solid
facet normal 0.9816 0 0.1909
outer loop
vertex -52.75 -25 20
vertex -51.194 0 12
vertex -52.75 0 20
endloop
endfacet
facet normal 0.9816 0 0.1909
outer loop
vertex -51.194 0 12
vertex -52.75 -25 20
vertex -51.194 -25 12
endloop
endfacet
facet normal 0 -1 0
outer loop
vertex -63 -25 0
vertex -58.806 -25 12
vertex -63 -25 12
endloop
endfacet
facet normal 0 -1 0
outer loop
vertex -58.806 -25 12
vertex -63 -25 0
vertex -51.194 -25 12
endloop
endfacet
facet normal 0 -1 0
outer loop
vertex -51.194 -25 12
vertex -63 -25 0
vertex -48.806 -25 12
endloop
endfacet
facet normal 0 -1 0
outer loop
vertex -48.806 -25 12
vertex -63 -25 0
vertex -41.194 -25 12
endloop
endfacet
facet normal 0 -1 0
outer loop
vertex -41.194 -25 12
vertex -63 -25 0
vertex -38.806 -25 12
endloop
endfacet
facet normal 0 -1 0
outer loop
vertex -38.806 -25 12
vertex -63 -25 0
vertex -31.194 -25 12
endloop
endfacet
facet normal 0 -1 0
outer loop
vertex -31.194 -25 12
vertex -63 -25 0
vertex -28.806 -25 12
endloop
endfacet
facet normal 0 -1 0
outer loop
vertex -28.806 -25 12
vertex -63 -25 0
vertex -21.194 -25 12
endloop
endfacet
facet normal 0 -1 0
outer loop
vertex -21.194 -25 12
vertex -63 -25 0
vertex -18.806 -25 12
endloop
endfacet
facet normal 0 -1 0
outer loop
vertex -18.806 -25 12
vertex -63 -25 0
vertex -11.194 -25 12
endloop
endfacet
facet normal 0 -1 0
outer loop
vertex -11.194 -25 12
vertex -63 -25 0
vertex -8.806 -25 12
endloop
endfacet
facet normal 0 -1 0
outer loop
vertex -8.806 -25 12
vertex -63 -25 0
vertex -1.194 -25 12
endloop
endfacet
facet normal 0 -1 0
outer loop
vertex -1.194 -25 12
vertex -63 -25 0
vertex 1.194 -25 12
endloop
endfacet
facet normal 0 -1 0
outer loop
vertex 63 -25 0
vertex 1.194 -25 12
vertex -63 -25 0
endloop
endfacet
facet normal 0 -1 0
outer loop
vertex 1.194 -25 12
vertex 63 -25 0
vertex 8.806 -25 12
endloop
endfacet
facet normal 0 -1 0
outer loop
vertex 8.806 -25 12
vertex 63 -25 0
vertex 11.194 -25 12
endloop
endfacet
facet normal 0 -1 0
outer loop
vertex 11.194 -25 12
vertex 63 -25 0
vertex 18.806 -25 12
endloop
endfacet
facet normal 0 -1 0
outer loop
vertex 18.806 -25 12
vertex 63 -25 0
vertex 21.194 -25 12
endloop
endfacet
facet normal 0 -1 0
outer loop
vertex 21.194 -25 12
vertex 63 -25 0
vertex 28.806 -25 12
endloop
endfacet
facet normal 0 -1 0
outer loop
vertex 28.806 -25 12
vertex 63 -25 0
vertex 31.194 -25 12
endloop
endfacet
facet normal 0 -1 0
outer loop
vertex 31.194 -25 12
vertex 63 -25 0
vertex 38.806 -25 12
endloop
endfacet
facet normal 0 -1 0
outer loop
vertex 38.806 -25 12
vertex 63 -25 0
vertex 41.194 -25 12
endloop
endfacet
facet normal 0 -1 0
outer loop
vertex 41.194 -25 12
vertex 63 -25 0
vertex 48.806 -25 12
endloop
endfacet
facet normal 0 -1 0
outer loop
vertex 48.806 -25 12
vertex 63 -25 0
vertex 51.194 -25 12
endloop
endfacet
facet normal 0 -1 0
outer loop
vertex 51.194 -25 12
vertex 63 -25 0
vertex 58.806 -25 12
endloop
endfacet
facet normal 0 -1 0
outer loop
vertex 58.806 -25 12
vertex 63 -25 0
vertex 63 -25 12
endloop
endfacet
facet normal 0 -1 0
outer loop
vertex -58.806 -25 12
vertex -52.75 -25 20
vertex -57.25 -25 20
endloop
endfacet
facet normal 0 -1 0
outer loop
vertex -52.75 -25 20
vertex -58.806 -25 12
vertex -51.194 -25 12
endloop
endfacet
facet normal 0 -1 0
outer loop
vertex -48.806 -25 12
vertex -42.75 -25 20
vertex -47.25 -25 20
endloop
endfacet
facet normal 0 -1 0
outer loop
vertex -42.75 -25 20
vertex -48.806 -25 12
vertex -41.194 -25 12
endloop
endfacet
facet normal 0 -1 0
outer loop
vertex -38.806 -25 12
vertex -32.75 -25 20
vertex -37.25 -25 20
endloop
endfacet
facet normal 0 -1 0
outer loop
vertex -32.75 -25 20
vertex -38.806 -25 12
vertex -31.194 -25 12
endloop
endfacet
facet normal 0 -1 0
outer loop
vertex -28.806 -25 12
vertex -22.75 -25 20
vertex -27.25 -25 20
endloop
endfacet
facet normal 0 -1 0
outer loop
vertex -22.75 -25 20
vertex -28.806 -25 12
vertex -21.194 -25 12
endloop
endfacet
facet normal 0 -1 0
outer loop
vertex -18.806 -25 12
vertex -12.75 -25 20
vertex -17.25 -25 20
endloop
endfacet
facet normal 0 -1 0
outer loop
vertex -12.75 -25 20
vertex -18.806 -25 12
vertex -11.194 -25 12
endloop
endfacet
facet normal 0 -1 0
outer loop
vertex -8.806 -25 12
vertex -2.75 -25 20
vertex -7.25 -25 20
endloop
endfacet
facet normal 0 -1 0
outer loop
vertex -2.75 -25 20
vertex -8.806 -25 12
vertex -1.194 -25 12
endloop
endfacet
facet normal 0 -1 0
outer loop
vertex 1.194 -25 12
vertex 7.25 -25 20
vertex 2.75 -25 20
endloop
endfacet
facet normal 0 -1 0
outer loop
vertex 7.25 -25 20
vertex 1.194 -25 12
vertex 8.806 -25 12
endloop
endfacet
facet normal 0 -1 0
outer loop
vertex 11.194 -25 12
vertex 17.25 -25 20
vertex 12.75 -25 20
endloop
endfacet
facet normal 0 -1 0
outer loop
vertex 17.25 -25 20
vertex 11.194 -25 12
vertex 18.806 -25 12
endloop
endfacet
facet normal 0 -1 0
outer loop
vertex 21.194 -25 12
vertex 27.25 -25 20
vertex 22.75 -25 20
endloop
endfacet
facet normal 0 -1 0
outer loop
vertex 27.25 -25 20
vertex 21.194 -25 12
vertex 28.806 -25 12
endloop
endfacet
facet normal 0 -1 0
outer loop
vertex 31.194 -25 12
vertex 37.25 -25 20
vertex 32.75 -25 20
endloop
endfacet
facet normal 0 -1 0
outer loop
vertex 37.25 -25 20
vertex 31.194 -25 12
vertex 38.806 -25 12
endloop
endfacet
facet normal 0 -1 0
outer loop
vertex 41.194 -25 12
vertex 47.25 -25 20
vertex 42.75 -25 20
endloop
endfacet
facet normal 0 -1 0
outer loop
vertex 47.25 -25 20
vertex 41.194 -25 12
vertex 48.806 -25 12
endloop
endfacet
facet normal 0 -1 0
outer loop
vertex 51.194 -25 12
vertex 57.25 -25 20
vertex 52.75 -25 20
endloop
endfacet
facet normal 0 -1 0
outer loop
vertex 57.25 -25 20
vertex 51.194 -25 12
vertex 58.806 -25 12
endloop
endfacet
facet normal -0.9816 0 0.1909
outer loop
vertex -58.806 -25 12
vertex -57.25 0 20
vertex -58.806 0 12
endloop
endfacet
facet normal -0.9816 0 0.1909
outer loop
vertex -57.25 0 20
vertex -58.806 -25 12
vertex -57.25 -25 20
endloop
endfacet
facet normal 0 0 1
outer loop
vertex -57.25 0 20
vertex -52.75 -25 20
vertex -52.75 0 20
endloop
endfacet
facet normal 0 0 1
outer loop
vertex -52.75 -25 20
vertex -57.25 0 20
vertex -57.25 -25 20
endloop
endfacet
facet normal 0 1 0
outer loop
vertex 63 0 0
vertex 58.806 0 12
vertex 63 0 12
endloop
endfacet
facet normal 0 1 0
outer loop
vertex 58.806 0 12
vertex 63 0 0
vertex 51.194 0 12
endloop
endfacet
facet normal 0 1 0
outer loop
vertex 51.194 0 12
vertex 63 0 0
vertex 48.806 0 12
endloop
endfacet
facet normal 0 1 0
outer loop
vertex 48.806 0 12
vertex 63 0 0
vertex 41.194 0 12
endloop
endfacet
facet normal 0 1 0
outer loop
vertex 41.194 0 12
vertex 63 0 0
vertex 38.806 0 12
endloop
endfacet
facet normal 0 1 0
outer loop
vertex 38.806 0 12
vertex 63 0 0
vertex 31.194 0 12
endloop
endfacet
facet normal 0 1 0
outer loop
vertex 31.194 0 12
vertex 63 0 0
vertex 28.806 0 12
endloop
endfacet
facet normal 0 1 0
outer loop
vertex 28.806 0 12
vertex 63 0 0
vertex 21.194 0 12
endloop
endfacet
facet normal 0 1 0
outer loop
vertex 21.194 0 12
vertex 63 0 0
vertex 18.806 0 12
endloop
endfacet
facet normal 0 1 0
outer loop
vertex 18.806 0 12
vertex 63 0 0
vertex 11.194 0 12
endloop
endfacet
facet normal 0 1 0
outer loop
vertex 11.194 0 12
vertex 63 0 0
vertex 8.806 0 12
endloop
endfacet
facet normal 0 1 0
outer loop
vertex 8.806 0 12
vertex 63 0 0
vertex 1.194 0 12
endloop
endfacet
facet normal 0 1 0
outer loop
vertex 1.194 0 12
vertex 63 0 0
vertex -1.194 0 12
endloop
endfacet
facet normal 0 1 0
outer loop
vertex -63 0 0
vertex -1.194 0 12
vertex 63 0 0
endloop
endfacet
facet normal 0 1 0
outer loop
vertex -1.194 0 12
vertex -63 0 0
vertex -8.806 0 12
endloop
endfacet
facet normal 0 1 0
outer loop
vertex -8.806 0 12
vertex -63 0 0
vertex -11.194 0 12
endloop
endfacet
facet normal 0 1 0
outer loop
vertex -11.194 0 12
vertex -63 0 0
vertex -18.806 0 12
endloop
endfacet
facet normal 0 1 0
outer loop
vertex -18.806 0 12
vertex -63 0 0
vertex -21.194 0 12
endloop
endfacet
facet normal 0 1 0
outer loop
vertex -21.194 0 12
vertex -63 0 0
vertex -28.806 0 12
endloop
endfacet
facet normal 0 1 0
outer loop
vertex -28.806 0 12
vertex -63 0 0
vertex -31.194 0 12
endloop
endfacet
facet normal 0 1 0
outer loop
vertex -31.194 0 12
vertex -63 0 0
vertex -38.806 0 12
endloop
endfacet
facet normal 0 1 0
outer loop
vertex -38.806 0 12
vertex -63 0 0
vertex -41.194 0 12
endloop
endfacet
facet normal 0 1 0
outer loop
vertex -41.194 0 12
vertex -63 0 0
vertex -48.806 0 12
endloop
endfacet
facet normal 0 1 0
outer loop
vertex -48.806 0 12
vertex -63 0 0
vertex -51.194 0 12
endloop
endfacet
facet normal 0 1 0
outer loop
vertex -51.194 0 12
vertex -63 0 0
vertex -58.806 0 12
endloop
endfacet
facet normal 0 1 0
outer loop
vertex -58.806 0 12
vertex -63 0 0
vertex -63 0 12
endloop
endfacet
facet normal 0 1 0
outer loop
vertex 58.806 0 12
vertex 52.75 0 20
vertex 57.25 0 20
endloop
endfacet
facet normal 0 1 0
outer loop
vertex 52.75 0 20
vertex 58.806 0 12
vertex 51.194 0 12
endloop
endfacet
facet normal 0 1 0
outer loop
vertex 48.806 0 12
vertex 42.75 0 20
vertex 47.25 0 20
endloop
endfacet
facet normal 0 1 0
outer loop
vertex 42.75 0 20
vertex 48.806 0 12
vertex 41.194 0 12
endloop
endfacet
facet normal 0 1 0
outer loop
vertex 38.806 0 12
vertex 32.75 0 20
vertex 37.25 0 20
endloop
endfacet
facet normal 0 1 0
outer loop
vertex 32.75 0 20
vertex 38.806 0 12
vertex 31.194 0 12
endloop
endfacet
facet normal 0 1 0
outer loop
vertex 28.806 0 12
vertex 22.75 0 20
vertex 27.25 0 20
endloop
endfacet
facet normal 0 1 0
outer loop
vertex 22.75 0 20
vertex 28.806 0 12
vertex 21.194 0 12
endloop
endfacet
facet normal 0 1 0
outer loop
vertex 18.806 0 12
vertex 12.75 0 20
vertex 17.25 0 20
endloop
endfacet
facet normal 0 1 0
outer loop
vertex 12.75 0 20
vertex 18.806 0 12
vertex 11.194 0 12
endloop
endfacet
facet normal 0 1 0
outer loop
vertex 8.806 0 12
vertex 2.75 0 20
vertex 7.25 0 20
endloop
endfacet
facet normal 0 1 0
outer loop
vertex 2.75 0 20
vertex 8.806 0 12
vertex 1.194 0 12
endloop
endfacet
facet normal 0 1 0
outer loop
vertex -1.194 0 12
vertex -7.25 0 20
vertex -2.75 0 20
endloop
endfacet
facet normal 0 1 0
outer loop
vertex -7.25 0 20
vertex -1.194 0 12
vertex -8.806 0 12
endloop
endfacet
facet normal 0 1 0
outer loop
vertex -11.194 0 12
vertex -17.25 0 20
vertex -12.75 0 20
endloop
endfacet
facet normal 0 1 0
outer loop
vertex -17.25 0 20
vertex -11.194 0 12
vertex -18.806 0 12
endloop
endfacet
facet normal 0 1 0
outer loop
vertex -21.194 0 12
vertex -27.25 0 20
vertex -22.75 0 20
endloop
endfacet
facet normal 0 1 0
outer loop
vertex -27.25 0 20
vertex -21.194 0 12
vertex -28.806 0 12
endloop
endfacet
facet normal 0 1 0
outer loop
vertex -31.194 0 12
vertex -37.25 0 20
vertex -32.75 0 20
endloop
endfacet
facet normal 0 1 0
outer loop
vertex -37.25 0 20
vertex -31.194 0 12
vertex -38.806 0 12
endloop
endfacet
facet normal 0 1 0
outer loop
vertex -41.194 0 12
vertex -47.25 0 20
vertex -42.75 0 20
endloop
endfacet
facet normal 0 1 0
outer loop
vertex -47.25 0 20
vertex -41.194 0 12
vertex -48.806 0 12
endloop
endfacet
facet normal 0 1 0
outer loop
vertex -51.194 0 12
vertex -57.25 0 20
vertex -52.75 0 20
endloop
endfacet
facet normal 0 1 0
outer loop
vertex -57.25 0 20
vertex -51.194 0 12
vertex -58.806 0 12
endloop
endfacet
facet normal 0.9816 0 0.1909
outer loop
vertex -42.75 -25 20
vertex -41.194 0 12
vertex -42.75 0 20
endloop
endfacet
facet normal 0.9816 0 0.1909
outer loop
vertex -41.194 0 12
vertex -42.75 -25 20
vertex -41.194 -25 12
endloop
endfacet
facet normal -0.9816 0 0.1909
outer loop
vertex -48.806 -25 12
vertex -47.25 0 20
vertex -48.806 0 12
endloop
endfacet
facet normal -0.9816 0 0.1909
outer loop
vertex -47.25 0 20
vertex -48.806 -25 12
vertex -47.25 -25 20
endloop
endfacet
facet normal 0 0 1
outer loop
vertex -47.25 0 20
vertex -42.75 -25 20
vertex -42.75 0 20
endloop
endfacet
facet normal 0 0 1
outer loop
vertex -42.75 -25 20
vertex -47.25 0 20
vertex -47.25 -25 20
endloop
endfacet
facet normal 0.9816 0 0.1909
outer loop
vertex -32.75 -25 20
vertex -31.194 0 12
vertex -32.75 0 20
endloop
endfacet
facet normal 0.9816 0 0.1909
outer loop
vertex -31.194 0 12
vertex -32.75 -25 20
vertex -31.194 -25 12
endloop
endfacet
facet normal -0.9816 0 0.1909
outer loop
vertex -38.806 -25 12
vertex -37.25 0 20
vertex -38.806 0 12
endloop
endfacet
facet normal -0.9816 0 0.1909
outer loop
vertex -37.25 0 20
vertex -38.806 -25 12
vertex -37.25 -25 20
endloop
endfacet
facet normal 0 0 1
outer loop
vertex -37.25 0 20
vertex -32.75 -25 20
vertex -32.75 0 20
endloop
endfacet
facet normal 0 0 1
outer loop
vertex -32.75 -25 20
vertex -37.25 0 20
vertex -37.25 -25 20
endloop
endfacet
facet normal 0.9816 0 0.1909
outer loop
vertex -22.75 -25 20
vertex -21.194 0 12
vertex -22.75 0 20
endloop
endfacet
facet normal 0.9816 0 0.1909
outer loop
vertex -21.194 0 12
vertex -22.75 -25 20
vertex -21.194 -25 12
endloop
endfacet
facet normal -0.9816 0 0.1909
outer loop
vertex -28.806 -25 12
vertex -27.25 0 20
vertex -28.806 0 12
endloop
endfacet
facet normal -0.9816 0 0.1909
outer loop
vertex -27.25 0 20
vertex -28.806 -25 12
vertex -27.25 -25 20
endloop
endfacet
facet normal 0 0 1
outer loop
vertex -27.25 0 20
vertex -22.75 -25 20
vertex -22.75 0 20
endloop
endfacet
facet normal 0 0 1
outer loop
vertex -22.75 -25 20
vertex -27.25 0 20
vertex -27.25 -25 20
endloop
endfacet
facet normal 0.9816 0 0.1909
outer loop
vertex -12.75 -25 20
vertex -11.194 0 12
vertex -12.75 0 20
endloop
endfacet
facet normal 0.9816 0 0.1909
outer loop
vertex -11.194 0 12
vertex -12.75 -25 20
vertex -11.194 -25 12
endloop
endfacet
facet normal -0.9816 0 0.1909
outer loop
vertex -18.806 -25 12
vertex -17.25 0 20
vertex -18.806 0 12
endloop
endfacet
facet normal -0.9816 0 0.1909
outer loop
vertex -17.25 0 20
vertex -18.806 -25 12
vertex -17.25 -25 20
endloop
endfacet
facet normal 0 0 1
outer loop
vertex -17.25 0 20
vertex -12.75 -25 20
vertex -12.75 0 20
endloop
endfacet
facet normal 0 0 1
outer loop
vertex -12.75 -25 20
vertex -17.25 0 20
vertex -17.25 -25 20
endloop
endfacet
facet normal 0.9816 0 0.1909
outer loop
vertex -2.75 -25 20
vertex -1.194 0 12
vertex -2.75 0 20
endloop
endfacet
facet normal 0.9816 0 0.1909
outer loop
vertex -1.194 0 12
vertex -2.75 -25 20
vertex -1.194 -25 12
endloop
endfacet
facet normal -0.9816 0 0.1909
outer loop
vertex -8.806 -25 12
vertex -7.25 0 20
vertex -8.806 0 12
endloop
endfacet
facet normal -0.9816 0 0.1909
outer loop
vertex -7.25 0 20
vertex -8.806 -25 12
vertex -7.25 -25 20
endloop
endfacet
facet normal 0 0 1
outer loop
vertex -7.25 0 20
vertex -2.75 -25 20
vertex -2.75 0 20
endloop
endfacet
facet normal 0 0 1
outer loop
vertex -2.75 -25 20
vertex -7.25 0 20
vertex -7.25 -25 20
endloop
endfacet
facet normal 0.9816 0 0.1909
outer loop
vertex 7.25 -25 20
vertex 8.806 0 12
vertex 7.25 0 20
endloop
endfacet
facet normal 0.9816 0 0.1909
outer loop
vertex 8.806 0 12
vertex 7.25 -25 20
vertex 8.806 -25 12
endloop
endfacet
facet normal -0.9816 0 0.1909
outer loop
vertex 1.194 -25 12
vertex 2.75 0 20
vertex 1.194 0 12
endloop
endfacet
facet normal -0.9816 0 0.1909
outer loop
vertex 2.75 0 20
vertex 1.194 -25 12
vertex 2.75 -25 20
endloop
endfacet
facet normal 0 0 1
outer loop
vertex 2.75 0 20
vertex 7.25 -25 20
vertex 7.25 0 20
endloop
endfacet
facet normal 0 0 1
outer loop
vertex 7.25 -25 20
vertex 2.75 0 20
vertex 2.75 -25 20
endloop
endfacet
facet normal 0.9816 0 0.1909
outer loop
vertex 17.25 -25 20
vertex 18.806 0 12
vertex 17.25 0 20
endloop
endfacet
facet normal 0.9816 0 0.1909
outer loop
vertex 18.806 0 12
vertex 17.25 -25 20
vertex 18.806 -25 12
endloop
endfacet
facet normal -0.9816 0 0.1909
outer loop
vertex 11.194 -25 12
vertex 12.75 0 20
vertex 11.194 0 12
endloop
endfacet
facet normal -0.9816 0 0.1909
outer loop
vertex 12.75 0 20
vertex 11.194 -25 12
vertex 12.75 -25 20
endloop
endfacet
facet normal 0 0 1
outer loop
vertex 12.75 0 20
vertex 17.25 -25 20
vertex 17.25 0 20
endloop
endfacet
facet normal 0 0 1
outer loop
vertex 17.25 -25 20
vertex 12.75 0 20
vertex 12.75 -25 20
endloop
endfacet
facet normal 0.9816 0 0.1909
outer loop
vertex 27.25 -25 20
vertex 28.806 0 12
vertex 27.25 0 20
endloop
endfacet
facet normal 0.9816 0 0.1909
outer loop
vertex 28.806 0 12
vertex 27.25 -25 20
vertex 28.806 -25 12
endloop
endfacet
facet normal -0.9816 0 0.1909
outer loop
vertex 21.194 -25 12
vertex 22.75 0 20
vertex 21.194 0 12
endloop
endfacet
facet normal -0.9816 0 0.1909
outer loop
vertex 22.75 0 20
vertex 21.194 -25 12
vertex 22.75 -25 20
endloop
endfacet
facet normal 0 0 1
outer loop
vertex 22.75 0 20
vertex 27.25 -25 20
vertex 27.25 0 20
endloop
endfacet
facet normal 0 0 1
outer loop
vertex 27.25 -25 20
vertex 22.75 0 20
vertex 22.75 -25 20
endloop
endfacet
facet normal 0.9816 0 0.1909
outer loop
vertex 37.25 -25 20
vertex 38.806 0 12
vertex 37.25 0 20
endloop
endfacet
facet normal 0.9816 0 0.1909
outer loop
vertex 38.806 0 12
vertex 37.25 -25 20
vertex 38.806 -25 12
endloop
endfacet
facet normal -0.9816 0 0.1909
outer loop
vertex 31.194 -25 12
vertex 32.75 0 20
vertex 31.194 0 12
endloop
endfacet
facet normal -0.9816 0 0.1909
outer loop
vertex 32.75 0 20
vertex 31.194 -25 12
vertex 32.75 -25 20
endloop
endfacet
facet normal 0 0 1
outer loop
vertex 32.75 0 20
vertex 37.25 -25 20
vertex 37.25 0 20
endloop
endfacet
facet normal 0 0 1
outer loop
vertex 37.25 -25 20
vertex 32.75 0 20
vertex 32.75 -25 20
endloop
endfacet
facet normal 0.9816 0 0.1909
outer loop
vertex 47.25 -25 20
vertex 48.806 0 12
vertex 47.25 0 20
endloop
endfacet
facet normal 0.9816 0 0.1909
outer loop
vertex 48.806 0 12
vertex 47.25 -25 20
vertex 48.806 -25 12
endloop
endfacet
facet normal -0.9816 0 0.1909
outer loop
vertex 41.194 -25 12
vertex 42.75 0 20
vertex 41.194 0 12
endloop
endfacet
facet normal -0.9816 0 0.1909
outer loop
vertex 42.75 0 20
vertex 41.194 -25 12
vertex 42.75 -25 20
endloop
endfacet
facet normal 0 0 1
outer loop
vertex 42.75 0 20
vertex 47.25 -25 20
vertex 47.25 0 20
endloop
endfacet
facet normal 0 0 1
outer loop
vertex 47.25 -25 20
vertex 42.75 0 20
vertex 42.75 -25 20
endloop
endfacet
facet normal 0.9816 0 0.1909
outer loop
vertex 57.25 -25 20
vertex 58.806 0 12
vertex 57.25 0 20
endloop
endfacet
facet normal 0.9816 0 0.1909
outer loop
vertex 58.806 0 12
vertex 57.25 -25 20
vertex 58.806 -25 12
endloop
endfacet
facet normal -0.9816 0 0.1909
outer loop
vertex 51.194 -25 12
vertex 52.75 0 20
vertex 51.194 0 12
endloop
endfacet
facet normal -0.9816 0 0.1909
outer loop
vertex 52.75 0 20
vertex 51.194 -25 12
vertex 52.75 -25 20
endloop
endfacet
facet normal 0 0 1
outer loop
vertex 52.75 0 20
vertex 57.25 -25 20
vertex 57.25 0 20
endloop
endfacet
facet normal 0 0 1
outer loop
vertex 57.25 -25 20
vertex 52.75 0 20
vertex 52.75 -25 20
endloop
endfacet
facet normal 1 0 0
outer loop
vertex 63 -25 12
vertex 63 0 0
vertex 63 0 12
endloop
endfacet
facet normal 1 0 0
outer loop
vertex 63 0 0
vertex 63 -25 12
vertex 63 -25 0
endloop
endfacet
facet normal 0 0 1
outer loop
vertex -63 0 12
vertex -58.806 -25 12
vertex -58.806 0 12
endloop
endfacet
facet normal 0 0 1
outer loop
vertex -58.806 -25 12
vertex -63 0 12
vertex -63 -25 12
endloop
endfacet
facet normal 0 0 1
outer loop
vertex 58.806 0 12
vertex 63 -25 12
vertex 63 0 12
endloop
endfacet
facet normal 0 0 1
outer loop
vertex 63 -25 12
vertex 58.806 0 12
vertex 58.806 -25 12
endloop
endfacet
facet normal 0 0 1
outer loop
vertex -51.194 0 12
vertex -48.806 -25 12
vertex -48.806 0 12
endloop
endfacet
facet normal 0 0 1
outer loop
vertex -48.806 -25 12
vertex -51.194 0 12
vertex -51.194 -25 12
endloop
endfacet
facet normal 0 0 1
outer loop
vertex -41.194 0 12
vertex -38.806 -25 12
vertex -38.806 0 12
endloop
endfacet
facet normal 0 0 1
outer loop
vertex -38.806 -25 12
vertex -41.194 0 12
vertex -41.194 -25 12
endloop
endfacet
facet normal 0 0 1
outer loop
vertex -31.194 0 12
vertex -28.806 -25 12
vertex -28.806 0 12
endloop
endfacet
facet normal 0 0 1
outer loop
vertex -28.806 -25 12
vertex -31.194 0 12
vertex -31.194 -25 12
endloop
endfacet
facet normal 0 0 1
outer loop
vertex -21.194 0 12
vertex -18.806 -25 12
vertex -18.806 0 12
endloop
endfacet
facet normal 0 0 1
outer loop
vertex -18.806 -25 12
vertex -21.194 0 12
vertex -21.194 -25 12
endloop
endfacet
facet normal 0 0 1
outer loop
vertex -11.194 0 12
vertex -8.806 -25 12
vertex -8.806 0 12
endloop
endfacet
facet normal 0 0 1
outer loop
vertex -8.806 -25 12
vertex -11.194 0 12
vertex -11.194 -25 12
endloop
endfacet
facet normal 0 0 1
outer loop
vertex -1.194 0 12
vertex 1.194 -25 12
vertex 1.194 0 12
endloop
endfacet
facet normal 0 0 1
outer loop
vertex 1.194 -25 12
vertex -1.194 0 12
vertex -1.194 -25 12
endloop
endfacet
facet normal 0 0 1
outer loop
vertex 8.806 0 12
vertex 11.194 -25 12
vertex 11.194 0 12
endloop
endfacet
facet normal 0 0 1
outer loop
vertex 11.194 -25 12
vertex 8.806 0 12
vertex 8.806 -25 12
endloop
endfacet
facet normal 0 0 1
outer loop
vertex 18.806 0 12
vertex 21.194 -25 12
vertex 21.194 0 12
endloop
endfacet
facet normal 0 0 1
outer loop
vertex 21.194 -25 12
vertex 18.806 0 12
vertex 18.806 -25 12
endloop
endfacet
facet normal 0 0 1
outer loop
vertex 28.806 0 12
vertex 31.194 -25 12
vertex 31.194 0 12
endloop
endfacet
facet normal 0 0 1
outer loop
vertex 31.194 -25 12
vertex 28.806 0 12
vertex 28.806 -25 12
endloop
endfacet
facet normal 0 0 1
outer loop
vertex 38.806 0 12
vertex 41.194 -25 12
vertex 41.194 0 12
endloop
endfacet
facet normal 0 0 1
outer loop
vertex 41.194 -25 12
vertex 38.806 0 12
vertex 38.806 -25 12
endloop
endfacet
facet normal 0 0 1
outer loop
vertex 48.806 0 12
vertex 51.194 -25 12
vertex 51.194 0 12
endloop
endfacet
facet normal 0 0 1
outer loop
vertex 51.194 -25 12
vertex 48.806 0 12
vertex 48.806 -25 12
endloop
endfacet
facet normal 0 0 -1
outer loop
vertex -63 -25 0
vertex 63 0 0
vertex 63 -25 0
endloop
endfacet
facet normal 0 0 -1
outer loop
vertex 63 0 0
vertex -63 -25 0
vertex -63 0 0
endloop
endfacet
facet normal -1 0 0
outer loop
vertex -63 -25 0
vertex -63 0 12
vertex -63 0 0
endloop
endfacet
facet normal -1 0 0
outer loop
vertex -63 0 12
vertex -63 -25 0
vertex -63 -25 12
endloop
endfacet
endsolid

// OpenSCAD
$fn = 32;

// ----------------------------------------------------------------------
// Toothed rack, 12 teeth
// 10 mm pitch, 8 mm teeth
// ----------------------------------------------------------------------

// --- parameters (mm) ---
bar_w = 25;     // bar width (Y)
bar_h = 12;     // bar height (Z)
teeth = 12;     // number of teeth
pitch = 10;     // tooth pitch
tooth_h = 8;    // tooth height above the bar
root_w = 8;     // tooth width at the root
crest_w = 4.5;  // tooth width at the crest

// --- derived feature positions (mm) ---
span = (teeth - 1) * pitch;  // = 110   distance between the outer teeth
bar_l = span + root_w + 8;   // = 126   bar length: teeth plus 4 mm at each end
tooth_x = -span / 2;         // = -55   X of the first tooth
height = bar_h + tooth_h;    // = 20   overall height
feature_centers = [
  [tooth_x + 0 * pitch, -bar_w / 2],
  [tooth_x + 1 * pitch, -bar_w / 2],
  [tooth_x + 2 * pitch, -bar_w / 2],
  [tooth_x + 3 * pitch, -bar_w / 2],
  [tooth_x + 4 * pitch, -bar_w / 2],
  [tooth_x + 5 * pitch, -bar_w / 2],
  [tooth_x + 6 * pitch, -bar_w / 2],
  [tooth_x + 7 * pitch, -bar_w / 2],
  [tooth_x + 8 * pitch, -bar_w / 2],
  [tooth_x + 9 * pitch, -bar_w / 2],
  [tooth_x + 10 * pitch, -bar_w / 2],
  [tooth_x + 11 * pitch, -bar_w / 2]
];   // tooth centre line, drives the tooth loop

// bar with a rack of teeth, one extruded trapezoium per centre
module rack_tooth() {
  linear_extrude(height = bar_w)
    polygon(points = [
      [0, 0],
      [root_w, 0],
      [root_w / 2 + crest_w / 2, tooth_h + 1],
      [root_w / 2 - crest_w / 2, tooth_h + 1]
    ]);
}

union() {
  translate([-bar_l / 2, -bar_w, 0]) cube([bar_l, bar_w, bar_h]);
  for (centre = feature_centers)
    translate([centre[0] - root_w / 2, 0, bar_h - 1]) rotate([90, 0, 0]) rack_tooth();
}
